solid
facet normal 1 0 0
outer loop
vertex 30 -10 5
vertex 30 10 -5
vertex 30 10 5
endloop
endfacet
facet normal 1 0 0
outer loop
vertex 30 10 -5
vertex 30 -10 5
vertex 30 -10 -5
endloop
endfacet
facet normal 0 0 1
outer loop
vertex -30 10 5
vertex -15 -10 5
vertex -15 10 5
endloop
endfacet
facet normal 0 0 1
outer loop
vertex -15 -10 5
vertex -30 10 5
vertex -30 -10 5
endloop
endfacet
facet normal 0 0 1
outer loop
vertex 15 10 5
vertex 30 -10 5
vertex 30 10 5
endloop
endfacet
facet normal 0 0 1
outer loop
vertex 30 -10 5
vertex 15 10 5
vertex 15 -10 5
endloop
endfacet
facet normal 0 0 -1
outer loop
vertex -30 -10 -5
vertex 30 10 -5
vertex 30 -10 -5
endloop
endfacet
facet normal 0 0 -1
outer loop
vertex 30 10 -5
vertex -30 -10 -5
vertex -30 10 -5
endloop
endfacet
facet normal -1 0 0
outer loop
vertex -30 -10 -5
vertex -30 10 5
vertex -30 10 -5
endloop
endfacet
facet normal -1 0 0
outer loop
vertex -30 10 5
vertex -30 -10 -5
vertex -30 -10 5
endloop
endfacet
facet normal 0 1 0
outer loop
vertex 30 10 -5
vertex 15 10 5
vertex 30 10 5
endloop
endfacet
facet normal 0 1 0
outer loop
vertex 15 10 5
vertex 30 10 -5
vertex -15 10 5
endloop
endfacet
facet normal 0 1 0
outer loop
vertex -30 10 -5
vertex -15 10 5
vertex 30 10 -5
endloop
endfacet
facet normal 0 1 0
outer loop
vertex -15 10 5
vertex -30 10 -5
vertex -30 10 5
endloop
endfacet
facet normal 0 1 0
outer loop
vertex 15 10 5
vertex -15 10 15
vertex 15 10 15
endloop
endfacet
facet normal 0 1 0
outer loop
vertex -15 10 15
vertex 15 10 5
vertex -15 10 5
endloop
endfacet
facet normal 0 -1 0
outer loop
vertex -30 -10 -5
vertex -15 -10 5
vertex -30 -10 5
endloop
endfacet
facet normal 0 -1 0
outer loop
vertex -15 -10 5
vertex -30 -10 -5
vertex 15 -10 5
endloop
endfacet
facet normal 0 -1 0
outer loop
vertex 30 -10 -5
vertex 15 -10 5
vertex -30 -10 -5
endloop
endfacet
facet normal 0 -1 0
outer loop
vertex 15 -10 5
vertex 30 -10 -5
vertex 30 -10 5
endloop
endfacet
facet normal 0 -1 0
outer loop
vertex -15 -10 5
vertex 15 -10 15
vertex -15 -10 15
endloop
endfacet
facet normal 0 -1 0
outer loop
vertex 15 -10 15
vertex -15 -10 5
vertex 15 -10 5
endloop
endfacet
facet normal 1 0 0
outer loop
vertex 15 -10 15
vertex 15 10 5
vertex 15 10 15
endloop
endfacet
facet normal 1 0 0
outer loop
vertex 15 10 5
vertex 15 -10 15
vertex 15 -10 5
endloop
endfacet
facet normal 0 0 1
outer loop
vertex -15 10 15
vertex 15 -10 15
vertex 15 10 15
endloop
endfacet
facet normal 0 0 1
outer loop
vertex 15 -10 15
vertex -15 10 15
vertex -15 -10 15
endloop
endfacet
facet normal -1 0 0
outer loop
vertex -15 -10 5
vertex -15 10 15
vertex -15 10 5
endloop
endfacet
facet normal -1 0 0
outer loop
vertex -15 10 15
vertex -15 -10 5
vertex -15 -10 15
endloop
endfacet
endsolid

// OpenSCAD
cube([60,20,10],center=true);
translate([0,0,10])
    cube([30,20,10],center=true);
